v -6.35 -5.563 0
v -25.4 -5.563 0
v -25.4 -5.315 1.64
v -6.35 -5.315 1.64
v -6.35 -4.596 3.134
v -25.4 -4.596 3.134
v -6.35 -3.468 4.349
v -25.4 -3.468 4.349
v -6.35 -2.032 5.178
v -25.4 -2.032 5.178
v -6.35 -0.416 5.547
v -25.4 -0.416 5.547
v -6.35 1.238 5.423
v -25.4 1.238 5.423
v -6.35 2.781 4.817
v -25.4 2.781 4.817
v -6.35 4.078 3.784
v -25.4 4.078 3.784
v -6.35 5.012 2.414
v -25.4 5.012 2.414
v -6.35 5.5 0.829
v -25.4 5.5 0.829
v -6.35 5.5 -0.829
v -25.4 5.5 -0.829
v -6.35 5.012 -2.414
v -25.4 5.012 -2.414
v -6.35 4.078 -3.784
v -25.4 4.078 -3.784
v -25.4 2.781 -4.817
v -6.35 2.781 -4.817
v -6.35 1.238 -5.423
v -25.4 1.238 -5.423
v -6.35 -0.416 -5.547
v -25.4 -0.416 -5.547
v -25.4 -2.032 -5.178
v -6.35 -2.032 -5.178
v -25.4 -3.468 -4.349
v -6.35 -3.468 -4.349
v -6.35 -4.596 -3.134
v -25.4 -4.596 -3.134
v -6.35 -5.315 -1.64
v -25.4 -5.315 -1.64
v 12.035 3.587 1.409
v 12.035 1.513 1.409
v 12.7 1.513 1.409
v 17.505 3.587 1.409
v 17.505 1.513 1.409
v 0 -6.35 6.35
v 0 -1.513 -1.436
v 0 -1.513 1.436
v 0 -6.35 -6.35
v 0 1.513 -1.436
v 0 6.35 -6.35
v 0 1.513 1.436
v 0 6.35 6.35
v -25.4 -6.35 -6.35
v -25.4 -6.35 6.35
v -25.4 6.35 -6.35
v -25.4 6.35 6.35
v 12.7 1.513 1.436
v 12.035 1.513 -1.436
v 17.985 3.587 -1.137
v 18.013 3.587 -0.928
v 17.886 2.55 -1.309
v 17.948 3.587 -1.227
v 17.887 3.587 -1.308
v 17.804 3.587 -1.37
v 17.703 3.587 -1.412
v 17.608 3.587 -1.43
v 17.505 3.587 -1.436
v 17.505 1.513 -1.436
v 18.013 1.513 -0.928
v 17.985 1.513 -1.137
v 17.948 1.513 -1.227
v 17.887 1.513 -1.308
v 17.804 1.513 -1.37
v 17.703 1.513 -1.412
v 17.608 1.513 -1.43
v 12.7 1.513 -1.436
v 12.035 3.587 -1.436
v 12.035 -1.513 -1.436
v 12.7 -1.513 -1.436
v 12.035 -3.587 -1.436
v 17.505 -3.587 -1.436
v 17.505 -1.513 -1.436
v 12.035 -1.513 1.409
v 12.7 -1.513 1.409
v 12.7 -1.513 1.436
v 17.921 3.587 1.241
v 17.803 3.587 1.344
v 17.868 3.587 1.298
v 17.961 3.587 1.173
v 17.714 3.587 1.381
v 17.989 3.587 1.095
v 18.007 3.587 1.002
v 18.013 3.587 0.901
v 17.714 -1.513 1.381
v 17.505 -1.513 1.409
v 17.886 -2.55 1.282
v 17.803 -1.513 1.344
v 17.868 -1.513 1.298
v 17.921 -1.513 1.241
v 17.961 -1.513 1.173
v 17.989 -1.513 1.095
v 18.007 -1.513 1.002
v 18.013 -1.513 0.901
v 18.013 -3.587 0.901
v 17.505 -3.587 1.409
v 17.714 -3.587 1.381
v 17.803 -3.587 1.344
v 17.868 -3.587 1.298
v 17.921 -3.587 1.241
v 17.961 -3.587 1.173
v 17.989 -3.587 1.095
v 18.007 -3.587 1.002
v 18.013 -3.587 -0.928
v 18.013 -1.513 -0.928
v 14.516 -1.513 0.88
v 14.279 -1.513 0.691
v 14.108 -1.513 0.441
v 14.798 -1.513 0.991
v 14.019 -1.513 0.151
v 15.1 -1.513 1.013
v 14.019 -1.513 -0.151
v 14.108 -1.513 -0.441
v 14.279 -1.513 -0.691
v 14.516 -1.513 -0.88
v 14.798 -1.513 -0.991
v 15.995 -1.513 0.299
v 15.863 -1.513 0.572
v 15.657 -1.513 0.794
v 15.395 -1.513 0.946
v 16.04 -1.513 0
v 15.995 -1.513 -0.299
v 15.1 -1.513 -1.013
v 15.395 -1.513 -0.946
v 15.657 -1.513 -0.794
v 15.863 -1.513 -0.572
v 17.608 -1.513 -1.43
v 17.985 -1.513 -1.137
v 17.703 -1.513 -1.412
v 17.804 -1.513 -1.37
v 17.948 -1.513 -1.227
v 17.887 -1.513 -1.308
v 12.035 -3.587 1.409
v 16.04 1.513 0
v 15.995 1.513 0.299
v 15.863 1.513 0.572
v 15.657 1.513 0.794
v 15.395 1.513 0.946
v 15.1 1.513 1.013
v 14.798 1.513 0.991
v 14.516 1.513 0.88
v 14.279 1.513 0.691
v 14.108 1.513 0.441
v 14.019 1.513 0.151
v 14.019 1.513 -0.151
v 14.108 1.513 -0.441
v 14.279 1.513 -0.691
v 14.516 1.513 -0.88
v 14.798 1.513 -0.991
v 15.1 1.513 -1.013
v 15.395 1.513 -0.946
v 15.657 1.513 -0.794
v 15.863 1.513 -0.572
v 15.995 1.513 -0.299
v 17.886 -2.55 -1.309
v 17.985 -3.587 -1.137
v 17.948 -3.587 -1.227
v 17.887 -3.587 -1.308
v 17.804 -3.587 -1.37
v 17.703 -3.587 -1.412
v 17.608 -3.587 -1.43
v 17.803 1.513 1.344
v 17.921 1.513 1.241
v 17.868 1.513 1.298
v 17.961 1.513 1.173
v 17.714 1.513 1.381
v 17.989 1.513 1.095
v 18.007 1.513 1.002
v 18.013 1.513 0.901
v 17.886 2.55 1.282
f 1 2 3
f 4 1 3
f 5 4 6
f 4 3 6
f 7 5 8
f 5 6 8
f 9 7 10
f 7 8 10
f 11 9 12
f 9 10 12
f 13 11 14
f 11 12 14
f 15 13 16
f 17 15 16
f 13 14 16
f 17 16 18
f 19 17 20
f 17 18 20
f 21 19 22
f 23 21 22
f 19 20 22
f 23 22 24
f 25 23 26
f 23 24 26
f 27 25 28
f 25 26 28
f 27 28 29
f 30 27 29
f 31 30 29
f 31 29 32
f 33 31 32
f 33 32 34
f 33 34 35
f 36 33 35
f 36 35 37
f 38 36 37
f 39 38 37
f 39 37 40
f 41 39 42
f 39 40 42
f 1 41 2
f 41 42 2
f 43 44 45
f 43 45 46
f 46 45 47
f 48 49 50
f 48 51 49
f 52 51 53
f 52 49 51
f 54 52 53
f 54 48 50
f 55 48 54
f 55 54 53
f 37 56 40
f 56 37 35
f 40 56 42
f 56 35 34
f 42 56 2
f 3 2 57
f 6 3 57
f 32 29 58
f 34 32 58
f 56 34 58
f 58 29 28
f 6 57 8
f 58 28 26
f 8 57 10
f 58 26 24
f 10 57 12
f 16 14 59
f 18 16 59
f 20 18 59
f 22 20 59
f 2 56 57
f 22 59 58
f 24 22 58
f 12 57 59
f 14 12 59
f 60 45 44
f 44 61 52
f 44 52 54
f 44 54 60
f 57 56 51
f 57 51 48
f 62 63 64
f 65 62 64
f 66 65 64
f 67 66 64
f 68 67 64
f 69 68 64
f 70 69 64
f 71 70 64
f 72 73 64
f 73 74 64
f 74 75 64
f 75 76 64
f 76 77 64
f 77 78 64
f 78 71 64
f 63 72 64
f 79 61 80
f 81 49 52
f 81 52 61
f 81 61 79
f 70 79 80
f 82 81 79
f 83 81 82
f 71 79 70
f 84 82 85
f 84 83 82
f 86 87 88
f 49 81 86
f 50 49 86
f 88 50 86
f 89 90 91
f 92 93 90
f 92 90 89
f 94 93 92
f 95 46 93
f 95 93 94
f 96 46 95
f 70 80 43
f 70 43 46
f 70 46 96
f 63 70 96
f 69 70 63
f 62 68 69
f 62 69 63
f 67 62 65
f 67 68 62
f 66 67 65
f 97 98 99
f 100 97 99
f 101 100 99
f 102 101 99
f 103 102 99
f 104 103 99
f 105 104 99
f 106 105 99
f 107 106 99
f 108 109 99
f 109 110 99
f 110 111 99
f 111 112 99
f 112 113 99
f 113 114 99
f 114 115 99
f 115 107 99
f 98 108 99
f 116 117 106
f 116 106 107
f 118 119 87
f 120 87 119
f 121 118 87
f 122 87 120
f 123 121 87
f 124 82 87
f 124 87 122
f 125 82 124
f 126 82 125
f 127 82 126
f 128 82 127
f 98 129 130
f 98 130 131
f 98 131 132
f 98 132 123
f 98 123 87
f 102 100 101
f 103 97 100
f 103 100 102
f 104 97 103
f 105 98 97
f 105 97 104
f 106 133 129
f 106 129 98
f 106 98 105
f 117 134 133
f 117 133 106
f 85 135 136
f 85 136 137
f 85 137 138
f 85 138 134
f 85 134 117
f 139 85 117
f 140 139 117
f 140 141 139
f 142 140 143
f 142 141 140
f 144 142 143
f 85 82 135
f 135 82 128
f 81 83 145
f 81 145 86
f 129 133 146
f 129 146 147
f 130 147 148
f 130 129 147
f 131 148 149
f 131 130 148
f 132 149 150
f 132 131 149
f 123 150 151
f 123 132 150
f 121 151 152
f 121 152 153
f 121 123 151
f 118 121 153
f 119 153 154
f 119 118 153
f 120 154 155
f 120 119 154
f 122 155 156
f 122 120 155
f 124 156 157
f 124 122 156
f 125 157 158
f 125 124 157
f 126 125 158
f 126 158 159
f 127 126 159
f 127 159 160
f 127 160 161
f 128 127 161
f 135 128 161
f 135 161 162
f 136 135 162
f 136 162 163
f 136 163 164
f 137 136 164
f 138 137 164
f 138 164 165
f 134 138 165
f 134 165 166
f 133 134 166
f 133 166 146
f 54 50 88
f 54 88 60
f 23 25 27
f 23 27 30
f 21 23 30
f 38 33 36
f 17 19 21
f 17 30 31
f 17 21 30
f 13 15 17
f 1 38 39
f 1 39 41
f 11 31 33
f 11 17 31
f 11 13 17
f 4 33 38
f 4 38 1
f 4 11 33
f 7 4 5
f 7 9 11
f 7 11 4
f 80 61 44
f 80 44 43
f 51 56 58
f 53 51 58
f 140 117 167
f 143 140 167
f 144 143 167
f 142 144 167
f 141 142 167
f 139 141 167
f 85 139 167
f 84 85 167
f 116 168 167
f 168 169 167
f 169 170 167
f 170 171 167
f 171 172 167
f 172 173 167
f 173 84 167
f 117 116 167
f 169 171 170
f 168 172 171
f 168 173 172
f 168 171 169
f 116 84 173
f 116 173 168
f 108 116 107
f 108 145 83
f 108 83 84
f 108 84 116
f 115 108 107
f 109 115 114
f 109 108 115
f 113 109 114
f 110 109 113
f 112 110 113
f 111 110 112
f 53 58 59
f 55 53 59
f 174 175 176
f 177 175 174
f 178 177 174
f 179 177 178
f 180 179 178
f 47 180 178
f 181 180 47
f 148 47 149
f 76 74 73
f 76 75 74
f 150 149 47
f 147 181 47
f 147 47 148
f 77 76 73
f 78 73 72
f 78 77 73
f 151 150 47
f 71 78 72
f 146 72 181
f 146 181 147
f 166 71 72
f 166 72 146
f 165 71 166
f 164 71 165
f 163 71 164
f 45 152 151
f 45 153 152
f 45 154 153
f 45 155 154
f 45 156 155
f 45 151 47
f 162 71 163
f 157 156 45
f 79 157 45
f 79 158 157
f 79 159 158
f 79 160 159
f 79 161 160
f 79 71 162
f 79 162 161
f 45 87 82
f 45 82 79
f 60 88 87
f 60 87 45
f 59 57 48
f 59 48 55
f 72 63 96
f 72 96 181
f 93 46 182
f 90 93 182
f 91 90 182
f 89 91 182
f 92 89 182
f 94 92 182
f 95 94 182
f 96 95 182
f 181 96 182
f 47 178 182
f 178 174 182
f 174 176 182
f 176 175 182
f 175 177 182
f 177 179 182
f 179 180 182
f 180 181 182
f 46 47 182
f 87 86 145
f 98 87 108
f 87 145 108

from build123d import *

# Parameters (mm, degrees)
F0_W         = 12.7
F0_H         = 12.7
F1_DEPTH     = 25.4
F2_R         = 5.5626
F3_DEPTH     = 19.05
F4_W         = 3.0250146519
F4_H         = 2.872077981
F5_DEPTH     = 12.7
F7_DEPTH     = 2.8448
F8_R         = 1.016
F9_DEPTH     = 5.2832
F10_T1_DEPTH = 4.6143001951
F10_T3_DEPTH = 4.6143001951


# Not quite as in the source:
# - a fillet or chamfer that OpenCascade refuses, or shapes differently, is made with other operations: its cross-section is extruded or revolved along the edge and cut away or added


with BuildPart() as f1:
    # F0 (on Right) → F1 (new body)
    with BuildSketch(Plane.YZ):
        Rectangle(F0_W, F0_H)
    extrude(amount=-F1_DEPTH)

    # F2 (on face) → F3 (cut)
    with BuildSketch(Plane(origin=(-25.4, 0, 0), x_dir=(0, -1, 0), z_dir=(-1, 0, 0))):
        Circle(F2_R)
    extrude(amount=-F3_DEPTH, mode=Mode.SUBTRACT)

    # F4 (on face) → F5 (join)
    with BuildSketch(Plane.YZ):
        Rectangle(F4_W, F4_H)
    extrude(amount=F5_DEPTH)

    # F6 (on face) → F7 (join)
    with BuildSketch(Plane(origin=(0, 0, -1.4360389905), x_dir=(1, 0, 0), z_dir=(0, 0, -1))):
        Polygon((12.0346518233, 3.5868075211), (12.0346518233, 1.512507326), (12.7, 1.512507326), (18.0126260966, 1.512507326), (18.0126260966, 3.5868075211), align=None)
        Polygon((18.0126260966, -1.512507326), (12.7, -1.512507326), (12.0346518233, -1.512507326), (12.0346518233, -3.5868075211), (18.0126260966, -3.5868075211), align=None)
    extrude(amount=-F7_DEPTH)

    # F8 (on face) → F9 (join)
    with BuildSketch(Plane.XZ.offset(3.5868075211)):
        with Locations((15.02363896, 0)):
            Circle(F8_R)
    extrude(amount=-F9_DEPTH)

    # F10: fillet of radius 0.508 on 4 edges, made by hand

    # F10_s2 → F10_t1 (cut)
    with BuildSketch(Plane.XZ.offset(0.242507326)):
        with BuildLine():
            add(Edge.make_bspline(
                [(17.5046260966, -1.4360389905), (18.0126260966, -1.4360389905), (18.0126260966, -0.9280389905)],
                knots=[0, 0, 0, 1, 1, 1], degree=2, weights=[1, 1, 1]))
            Line((18.0126260966, -0.9280389905), (18.0126260966, -1.4360389905))
            Line((18.0126260966, -1.4360389905), (17.5046260966, -1.4360389905))
        make_face()
        with BuildLine():
            add(Edge.make_bspline(
                [(18.0126260966, 0.9007610095), (18.0126260966, 1.4087610095), (17.5046260966, 1.4087610095)],
                knots=[0, 0, 0, 1, 1, 1], degree=2, weights=[1, 1, 1]))
            Line((17.5046260966, 1.4087610095), (18.0126260966, 1.4087610095))
            Line((18.0126260966, 1.4087610095), (18.0126260966, 0.9007610095))
        make_face()
    extrude(amount=F10_T1_DEPTH, mode=Mode.SUBTRACT)

    # F10_s4 → F10_t3 (cut)
    with BuildSketch(Plane.XZ.offset(-4.8568075211)):
        with BuildLine():
            add(Edge.make_bspline(
                [(17.5046260966, -1.4360389905), (18.0126260966, -1.4360389905), (18.0126260966, -0.9280389905)],
                knots=[0, 0, 0, 1, 1, 1], degree=2, weights=[1, 1, 1]))
            Line((18.0126260966, -0.9280389905), (18.0126260966, -1.4360389905))
            Line((18.0126260966, -1.4360389905), (17.5046260966, -1.4360389905))
        make_face()
        with BuildLine():
            add(Edge.make_bspline(
                [(18.0126260966, 0.9007610095), (18.0126260966, 1.4087610095), (17.5046260966, 1.4087610095)],
                knots=[0, 0, 0, 1, 1, 1], degree=2, weights=[1, 1, 1]))
            Line((17.5046260966, 1.4087610095), (18.0126260966, 1.4087610095))
            Line((18.0126260966, 1.4087610095), (18.0126260966, 0.9007610095))
        make_face()
    extrude(amount=F10_T3_DEPTH, mode=Mode.SUBTRACT)


solid = f1.part
